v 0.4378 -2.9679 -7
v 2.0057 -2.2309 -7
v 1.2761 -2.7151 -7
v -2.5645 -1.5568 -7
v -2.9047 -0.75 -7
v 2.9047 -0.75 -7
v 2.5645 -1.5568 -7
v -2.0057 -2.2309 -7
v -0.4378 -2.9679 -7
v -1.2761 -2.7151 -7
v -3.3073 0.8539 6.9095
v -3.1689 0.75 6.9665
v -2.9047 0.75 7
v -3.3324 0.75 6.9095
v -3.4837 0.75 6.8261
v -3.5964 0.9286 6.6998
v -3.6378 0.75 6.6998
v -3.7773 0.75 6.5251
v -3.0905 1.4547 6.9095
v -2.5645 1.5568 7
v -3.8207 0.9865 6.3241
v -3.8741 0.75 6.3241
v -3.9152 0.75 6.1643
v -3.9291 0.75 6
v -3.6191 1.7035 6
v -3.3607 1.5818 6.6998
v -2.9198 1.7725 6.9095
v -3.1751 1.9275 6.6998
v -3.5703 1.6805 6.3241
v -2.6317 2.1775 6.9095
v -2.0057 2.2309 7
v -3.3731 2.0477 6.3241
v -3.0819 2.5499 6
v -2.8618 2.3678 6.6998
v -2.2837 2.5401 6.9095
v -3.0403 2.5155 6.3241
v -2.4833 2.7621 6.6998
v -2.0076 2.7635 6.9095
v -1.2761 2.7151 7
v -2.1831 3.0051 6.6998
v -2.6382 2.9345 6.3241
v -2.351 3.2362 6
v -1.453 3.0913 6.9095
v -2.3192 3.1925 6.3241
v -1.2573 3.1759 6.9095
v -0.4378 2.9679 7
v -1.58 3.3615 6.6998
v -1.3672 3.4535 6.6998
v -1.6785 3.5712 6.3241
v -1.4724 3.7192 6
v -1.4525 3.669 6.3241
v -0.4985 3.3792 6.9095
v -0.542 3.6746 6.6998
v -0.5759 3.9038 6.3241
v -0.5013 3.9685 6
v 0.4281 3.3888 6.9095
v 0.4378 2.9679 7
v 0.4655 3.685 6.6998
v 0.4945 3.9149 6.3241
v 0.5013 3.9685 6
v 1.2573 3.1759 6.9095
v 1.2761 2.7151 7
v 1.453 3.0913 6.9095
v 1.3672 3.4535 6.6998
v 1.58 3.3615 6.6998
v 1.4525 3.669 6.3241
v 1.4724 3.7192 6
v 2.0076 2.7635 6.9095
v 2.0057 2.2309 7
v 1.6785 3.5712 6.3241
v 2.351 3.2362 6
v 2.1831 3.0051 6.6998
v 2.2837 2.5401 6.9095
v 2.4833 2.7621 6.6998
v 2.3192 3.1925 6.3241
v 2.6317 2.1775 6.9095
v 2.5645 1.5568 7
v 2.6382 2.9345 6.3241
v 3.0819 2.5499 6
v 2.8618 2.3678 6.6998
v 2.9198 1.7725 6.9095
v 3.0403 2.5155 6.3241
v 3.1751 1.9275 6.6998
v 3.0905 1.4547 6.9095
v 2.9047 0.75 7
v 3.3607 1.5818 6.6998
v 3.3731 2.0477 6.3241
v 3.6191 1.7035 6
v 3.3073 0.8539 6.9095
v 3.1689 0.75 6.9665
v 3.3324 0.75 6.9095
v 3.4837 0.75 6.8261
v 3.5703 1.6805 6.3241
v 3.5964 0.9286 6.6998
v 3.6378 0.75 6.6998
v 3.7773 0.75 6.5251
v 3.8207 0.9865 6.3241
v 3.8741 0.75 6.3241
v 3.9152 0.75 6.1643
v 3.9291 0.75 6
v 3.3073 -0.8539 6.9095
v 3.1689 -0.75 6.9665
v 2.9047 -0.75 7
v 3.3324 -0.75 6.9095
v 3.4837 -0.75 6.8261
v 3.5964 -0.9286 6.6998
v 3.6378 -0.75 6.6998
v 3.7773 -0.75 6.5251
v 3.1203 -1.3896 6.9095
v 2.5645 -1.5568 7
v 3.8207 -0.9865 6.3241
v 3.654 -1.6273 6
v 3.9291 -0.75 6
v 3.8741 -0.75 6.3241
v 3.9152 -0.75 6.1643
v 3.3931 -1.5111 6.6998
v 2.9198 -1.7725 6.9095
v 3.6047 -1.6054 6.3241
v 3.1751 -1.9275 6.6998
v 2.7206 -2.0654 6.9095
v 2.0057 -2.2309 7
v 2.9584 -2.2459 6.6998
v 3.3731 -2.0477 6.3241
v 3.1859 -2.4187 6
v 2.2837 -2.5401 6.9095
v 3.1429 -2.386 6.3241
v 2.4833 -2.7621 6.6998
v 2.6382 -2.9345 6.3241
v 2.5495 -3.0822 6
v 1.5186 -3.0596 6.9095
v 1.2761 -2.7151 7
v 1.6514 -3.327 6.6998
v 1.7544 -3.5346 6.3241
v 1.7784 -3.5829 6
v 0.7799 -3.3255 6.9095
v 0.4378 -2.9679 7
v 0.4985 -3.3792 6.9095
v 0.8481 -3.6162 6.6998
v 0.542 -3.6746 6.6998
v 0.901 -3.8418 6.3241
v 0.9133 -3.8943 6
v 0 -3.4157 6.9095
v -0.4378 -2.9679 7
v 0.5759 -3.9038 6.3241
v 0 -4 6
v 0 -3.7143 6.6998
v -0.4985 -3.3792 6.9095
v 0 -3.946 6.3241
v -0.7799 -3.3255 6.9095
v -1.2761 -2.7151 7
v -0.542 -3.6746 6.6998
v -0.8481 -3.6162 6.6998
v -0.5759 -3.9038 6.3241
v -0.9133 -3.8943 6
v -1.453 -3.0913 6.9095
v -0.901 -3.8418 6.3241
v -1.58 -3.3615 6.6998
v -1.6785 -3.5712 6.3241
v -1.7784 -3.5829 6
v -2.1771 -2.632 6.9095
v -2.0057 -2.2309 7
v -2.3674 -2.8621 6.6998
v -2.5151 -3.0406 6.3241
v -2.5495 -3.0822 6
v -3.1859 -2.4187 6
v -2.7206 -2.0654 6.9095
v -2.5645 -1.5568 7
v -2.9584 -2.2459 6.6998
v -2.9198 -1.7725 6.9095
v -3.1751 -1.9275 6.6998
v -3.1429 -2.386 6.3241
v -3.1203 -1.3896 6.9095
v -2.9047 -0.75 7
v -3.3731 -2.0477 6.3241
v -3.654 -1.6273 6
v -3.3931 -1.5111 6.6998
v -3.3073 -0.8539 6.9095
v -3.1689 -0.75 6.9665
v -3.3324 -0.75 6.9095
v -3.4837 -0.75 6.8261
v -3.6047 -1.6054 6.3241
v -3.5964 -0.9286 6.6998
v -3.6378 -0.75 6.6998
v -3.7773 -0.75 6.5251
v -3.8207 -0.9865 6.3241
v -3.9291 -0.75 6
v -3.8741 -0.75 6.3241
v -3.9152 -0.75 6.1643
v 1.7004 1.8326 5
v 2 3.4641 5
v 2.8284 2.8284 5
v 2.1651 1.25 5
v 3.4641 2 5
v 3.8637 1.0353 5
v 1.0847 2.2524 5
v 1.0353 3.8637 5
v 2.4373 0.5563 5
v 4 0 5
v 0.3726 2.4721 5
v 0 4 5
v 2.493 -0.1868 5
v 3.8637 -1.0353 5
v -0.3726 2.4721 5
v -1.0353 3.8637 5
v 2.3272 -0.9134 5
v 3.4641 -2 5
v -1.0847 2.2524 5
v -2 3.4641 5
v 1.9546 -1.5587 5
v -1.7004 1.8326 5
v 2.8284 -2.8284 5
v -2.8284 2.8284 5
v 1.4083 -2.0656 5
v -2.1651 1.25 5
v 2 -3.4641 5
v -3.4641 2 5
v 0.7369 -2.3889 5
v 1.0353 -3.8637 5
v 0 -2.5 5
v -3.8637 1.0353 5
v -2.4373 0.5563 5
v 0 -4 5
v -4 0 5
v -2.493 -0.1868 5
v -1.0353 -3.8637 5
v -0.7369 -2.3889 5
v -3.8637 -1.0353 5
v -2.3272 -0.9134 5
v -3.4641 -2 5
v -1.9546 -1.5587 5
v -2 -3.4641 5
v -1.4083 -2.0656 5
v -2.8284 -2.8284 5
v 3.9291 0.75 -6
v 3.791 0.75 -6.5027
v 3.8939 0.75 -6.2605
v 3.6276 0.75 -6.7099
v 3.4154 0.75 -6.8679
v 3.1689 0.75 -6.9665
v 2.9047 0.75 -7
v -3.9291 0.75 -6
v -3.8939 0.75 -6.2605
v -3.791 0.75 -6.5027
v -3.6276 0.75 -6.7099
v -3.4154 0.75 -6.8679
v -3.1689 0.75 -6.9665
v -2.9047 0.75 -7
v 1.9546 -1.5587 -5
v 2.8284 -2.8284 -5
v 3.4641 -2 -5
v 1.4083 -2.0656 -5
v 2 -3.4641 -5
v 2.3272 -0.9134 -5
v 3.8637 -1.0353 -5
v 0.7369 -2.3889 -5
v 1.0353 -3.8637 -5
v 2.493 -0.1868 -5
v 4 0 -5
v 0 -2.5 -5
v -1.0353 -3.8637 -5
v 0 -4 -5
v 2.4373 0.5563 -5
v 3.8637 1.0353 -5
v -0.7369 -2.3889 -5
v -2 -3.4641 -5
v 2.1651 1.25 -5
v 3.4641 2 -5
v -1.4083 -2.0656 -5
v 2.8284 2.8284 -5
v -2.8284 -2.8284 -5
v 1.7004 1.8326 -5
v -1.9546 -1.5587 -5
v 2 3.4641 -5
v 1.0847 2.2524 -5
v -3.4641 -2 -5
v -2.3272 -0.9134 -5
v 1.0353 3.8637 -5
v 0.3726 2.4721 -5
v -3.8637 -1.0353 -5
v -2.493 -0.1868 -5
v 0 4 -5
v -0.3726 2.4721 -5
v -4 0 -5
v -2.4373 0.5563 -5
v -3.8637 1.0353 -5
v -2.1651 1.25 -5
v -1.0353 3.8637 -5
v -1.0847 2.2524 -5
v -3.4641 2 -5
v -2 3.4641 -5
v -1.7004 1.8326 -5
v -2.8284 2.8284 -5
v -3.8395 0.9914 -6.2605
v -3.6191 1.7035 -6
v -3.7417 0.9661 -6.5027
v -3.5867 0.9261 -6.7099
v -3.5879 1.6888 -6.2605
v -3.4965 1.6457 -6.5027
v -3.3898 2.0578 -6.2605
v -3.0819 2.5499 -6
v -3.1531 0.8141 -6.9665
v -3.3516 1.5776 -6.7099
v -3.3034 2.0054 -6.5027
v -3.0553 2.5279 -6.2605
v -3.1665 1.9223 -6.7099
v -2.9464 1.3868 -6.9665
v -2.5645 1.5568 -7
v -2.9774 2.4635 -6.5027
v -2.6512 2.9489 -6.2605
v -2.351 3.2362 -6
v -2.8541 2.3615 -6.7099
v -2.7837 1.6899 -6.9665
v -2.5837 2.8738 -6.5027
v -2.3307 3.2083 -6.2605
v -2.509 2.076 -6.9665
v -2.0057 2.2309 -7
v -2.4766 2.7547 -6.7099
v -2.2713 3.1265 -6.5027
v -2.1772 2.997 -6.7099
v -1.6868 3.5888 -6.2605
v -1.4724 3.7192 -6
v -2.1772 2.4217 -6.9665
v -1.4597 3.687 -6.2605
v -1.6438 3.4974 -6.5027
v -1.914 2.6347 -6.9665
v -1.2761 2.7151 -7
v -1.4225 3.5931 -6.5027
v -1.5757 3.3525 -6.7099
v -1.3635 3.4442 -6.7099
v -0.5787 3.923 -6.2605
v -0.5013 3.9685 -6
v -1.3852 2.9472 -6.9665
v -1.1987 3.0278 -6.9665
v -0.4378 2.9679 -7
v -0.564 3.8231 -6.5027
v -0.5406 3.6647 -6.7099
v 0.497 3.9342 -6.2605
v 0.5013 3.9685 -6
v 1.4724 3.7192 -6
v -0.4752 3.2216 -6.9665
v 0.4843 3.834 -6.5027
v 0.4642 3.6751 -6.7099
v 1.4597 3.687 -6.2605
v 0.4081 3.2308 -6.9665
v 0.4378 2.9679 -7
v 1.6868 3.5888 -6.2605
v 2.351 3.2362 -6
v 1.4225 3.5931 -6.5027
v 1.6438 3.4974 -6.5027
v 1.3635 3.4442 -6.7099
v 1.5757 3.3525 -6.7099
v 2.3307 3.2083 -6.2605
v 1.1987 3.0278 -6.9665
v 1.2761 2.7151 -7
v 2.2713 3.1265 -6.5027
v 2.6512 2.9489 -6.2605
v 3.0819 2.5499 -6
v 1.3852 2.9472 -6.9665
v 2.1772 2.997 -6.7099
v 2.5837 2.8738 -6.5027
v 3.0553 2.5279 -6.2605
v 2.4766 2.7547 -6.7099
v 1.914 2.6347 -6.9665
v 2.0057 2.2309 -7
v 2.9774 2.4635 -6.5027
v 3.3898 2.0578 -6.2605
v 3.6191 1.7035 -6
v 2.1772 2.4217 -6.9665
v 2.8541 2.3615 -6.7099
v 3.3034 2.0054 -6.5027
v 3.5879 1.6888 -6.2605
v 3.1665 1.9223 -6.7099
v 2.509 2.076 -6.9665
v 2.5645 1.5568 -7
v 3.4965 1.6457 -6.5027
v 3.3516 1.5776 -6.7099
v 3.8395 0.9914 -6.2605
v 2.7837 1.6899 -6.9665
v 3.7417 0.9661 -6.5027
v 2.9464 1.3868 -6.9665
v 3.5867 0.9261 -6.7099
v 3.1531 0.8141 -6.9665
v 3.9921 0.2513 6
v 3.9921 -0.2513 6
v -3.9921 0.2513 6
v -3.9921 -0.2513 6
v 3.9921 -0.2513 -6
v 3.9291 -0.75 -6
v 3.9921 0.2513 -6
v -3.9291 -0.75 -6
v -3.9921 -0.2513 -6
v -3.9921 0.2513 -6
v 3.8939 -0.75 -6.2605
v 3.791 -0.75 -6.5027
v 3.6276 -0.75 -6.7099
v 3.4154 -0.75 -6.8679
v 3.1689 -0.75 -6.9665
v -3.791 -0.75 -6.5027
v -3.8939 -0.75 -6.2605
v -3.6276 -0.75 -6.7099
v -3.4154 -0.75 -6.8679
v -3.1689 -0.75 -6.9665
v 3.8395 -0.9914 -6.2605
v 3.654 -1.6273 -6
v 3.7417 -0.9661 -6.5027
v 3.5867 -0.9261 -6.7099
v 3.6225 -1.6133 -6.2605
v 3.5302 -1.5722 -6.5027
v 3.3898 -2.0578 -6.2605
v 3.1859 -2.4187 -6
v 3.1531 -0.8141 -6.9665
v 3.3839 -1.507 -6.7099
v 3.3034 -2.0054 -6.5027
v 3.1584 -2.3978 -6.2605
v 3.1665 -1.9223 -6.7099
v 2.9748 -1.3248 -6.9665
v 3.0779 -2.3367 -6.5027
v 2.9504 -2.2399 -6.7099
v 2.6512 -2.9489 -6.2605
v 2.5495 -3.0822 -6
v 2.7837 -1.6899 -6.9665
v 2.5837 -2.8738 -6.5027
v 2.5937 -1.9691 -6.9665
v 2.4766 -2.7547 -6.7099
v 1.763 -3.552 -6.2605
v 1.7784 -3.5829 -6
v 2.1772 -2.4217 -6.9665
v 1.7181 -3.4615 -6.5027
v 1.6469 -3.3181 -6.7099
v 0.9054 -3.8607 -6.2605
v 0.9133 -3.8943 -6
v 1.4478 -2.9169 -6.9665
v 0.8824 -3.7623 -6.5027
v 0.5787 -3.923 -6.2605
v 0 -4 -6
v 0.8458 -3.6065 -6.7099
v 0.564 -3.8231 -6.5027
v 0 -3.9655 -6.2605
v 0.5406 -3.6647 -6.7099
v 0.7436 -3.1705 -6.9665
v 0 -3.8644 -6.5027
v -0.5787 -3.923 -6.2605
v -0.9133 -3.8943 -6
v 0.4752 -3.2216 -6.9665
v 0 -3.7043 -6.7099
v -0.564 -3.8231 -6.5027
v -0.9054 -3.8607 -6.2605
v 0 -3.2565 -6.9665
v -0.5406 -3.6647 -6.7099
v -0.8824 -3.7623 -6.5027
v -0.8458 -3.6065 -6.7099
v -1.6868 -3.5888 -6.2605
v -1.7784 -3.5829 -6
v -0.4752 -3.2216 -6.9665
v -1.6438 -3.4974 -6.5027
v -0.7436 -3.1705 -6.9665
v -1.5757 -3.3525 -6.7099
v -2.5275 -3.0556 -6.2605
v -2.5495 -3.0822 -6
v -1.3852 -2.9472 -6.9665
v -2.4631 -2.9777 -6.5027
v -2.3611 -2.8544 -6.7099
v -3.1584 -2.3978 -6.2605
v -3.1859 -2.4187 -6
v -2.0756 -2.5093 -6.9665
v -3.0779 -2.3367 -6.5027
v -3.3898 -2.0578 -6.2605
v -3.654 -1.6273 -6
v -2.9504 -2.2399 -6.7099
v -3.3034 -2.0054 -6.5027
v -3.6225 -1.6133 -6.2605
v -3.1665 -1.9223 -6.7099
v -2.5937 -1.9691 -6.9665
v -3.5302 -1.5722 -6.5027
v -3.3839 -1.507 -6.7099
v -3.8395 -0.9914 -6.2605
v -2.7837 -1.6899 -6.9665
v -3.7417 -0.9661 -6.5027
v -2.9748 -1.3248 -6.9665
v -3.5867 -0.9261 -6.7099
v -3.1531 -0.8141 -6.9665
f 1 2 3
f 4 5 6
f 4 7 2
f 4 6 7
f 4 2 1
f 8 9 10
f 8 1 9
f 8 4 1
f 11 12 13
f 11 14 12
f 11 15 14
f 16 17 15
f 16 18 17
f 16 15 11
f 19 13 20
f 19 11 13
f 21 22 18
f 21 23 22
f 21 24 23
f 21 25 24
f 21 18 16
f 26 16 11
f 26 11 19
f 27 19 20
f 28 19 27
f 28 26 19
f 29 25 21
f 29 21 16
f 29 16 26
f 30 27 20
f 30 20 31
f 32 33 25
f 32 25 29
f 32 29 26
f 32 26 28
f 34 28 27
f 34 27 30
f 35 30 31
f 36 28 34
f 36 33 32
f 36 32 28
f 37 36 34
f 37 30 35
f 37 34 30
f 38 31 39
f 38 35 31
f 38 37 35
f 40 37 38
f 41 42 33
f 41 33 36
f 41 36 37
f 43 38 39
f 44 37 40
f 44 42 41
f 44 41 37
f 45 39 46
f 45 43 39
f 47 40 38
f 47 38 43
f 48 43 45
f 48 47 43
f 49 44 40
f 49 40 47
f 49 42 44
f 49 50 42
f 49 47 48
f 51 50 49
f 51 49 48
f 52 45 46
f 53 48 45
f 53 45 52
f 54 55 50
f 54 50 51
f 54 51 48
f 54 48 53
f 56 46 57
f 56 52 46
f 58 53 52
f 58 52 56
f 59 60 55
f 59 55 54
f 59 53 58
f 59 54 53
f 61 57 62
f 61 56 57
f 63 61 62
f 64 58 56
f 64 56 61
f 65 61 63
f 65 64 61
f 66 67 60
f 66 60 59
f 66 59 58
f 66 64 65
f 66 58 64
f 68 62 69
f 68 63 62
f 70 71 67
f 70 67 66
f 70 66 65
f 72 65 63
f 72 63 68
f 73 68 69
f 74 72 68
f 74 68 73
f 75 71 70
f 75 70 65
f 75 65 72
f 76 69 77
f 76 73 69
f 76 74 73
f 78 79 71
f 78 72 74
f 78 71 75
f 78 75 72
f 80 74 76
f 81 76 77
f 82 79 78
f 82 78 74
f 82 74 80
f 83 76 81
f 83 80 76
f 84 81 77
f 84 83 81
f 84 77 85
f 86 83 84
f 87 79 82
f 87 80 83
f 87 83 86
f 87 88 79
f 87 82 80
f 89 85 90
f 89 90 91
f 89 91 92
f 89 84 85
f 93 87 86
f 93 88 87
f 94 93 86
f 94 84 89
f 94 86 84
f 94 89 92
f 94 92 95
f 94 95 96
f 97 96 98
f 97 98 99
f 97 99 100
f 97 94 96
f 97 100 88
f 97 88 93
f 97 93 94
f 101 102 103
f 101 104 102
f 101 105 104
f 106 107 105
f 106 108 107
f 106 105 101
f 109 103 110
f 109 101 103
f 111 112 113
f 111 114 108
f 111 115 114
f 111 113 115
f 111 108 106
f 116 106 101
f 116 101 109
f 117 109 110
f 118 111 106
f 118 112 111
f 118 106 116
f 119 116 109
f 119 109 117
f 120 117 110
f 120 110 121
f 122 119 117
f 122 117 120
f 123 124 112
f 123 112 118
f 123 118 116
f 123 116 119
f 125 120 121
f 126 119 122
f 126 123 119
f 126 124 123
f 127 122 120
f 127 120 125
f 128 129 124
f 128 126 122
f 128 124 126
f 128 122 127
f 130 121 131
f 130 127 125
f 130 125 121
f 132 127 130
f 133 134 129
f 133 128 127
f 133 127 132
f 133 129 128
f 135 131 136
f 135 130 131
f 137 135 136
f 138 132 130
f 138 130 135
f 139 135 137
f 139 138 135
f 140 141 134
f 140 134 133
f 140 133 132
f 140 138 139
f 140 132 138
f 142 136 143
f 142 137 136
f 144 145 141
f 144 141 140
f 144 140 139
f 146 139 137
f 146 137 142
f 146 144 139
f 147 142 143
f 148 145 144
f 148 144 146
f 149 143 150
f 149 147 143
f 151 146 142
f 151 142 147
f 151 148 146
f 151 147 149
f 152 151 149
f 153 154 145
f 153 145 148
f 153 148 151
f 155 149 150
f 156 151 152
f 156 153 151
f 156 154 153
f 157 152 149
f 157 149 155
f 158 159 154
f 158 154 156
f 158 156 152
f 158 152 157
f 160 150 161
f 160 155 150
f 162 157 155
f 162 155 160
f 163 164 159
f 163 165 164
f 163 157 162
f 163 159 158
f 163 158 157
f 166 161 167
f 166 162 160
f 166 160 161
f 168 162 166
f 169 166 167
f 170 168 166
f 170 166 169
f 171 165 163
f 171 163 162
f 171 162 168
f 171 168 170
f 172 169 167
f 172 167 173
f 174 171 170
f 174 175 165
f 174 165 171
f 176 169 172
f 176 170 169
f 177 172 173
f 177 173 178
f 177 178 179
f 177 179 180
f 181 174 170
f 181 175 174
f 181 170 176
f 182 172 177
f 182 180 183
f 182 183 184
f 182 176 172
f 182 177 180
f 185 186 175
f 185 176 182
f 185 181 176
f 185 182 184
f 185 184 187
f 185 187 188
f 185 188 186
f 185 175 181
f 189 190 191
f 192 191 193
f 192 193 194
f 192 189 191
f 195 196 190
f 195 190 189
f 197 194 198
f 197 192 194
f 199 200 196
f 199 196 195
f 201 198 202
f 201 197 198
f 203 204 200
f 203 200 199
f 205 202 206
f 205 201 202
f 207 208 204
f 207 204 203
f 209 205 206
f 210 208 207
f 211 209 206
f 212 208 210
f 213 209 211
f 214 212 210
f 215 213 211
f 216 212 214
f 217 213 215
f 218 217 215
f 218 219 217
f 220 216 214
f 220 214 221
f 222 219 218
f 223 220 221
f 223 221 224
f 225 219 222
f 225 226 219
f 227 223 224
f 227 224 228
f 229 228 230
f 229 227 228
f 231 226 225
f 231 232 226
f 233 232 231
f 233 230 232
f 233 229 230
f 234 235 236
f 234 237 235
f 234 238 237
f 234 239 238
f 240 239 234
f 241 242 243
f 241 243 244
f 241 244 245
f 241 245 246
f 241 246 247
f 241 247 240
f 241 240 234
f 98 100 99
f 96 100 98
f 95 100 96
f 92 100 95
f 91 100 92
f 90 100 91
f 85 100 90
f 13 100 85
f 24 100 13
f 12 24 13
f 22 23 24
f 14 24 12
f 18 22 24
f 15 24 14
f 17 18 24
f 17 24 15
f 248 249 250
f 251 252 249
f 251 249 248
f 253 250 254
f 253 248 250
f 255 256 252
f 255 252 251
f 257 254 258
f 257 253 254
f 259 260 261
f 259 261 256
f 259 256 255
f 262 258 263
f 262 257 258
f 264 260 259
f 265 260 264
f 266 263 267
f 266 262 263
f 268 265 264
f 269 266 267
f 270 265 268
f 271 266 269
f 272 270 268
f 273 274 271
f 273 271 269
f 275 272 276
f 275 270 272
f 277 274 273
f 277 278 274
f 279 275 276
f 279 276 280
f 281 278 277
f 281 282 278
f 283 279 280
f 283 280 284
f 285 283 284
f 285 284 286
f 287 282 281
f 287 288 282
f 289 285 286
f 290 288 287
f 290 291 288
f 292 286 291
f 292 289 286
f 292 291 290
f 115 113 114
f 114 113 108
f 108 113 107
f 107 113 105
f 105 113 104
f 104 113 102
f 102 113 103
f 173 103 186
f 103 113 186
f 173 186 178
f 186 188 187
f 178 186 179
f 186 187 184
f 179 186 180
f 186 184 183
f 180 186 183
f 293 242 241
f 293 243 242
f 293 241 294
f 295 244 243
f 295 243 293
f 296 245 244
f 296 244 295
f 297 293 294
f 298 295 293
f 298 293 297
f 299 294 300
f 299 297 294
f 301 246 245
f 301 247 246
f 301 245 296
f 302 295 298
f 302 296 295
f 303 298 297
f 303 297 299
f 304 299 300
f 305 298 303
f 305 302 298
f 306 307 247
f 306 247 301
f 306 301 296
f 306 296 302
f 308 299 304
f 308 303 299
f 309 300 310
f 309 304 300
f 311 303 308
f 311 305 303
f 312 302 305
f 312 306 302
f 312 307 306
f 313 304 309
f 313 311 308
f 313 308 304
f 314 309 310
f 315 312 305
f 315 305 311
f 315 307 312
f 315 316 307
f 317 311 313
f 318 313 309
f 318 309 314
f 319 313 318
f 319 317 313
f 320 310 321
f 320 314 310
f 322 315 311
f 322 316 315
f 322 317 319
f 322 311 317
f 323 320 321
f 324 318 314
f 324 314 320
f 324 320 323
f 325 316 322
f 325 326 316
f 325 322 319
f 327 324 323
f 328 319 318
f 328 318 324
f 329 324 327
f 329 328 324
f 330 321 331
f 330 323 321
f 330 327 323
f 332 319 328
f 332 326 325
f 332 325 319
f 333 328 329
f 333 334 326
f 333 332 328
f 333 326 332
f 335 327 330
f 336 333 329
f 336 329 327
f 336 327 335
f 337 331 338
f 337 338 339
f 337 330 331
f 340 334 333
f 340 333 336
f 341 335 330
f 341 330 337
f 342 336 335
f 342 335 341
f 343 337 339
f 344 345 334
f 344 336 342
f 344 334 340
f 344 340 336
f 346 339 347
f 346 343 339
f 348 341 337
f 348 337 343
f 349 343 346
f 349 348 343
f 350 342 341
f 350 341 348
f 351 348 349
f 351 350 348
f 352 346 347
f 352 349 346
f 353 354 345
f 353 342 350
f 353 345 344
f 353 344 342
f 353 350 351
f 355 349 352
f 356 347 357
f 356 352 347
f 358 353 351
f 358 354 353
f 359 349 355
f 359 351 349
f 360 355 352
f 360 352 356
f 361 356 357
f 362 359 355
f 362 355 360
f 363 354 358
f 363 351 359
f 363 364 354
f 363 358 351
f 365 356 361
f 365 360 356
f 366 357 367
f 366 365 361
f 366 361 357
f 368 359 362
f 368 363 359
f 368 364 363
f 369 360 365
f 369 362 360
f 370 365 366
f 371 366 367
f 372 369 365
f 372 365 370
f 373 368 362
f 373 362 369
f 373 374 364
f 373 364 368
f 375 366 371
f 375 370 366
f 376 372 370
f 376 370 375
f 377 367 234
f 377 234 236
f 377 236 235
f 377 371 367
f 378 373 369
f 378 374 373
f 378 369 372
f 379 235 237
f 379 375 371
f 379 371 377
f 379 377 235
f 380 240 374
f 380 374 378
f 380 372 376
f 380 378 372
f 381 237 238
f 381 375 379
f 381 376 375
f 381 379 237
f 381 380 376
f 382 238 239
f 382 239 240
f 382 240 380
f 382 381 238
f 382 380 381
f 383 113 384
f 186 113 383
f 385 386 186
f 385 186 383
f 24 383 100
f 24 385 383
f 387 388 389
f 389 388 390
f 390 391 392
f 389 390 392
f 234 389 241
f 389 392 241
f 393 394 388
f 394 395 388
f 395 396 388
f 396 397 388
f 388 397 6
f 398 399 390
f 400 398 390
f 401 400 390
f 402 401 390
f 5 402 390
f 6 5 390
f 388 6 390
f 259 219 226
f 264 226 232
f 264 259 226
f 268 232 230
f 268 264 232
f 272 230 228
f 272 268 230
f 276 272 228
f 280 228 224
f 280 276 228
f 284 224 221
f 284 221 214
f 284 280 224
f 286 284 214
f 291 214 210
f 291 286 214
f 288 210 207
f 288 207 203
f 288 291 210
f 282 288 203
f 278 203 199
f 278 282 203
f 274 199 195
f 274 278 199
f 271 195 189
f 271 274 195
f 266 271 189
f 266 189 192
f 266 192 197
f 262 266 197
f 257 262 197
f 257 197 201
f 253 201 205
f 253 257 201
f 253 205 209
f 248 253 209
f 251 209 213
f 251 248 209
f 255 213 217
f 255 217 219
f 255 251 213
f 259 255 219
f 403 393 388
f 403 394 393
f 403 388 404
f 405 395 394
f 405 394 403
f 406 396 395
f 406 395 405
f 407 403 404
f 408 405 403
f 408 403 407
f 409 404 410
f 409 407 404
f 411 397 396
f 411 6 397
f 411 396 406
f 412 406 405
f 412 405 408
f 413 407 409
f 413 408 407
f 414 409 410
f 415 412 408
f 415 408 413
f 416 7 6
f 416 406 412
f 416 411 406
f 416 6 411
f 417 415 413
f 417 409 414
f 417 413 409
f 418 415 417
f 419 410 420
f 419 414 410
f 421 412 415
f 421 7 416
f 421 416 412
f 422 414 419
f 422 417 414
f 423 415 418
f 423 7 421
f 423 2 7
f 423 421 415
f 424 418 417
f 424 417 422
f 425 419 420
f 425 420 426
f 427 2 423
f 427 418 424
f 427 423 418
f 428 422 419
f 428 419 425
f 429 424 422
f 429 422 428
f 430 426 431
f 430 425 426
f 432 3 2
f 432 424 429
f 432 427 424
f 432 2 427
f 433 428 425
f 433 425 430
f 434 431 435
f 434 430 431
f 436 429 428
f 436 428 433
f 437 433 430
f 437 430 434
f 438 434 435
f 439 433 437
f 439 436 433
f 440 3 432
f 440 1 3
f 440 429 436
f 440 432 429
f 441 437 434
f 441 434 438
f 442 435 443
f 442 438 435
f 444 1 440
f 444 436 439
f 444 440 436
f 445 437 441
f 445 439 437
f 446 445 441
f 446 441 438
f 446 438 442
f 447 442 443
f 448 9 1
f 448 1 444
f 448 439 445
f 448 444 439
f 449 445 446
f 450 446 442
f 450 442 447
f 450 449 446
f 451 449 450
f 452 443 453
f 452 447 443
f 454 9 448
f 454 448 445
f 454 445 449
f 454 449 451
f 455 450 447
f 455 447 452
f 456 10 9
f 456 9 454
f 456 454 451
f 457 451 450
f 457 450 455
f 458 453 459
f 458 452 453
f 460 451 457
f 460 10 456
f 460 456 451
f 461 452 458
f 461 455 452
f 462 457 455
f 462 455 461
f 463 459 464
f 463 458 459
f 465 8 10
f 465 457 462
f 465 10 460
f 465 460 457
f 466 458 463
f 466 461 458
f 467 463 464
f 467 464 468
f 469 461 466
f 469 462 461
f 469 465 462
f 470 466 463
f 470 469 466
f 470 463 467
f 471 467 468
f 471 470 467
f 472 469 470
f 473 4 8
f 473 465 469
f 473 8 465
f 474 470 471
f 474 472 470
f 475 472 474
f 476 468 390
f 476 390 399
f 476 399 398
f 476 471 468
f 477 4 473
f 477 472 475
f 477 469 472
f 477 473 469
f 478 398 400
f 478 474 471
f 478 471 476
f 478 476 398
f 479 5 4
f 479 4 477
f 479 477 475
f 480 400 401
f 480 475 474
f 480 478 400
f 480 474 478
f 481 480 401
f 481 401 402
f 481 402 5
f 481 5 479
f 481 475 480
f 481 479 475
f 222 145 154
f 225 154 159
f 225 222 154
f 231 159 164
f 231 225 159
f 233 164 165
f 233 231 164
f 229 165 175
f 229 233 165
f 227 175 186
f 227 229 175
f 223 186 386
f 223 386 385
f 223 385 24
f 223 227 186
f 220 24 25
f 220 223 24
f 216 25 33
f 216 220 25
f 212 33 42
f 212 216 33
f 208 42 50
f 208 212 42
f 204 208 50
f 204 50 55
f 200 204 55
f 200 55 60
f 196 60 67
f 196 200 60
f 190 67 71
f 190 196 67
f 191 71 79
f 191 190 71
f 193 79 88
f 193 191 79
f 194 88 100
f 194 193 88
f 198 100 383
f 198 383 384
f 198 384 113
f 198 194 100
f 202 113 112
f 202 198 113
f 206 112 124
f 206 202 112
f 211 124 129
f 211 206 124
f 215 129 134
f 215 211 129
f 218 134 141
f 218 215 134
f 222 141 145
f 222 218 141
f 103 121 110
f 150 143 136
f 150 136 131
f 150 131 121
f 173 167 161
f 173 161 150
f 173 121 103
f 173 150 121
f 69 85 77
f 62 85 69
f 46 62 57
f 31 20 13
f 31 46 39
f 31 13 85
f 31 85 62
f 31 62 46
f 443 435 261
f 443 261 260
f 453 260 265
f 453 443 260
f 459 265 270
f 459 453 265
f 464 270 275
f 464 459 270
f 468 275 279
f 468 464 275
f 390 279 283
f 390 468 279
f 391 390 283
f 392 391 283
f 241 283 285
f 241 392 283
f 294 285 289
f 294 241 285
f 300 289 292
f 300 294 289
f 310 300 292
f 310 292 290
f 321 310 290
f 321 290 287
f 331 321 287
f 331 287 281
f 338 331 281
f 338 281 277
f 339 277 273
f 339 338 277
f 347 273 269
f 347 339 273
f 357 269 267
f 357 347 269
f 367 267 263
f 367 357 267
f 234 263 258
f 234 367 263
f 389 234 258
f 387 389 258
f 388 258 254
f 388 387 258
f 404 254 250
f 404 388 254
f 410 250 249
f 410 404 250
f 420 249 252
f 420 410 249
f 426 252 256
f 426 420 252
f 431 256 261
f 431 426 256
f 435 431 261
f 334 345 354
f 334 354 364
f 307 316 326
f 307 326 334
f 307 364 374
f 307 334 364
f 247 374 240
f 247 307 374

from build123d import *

# Parameters (mm, degrees)
CUT_EXTRUDE1_DEPTH      = 10
CUT_EXTRUDE1_DEPTH_BACK = 10
SKETCH3_W               = 1.5
SKETCH3_H               = 1


with BuildPart() as part:
    # Sketch1 → Revolve1 (revolve)
    with BuildSketch(Plane.YZ, mode=Mode.PRIVATE) as revolve1_sk:
        with BuildLine():
            Line((0, 7), (3, 7))
            ThreePointArc((3, 7), (3.707106781, 6.707106781), (4, 6))
            Line((4, 6), (4, 5))
            Line((4, 5), (2.5, 5))
            Line((2.5, 5), (2.5, -5))
            Line((2.5, -5), (4, -5))
            Line((4, -5), (4, -6))
            ThreePointArc((4, -6), (3.707106781, -6.707106781), (3, -7))
            Line((3, -7), (0, -7))
            Line((0, -7), (0, 7))
        make_face()
    revolve(revolve1_sk.sketch.rotate(Axis((0, 0, 9.31839629), (0, 0, -1)), 180), axis=Axis((0, 0, 9.31839629), (0, 0, -1)))

    # Sketch3 → Cut-Extrude1 (cut, two sides: drawn at the far end of the back side and taken through both)
    with BuildSketch(Plane.YZ.offset(-CUT_EXTRUDE1_DEPTH_BACK)):
        with Locations((0, 6.5)):
            Rectangle(SKETCH3_W, SKETCH3_H)
        with Locations((0, -6.5)):
            Rectangle(SKETCH3_W, SKETCH3_H)
    extrude(amount=CUT_EXTRUDE1_DEPTH + CUT_EXTRUDE1_DEPTH_BACK, mode=Mode.SUBTRACT)


solid = part.part
